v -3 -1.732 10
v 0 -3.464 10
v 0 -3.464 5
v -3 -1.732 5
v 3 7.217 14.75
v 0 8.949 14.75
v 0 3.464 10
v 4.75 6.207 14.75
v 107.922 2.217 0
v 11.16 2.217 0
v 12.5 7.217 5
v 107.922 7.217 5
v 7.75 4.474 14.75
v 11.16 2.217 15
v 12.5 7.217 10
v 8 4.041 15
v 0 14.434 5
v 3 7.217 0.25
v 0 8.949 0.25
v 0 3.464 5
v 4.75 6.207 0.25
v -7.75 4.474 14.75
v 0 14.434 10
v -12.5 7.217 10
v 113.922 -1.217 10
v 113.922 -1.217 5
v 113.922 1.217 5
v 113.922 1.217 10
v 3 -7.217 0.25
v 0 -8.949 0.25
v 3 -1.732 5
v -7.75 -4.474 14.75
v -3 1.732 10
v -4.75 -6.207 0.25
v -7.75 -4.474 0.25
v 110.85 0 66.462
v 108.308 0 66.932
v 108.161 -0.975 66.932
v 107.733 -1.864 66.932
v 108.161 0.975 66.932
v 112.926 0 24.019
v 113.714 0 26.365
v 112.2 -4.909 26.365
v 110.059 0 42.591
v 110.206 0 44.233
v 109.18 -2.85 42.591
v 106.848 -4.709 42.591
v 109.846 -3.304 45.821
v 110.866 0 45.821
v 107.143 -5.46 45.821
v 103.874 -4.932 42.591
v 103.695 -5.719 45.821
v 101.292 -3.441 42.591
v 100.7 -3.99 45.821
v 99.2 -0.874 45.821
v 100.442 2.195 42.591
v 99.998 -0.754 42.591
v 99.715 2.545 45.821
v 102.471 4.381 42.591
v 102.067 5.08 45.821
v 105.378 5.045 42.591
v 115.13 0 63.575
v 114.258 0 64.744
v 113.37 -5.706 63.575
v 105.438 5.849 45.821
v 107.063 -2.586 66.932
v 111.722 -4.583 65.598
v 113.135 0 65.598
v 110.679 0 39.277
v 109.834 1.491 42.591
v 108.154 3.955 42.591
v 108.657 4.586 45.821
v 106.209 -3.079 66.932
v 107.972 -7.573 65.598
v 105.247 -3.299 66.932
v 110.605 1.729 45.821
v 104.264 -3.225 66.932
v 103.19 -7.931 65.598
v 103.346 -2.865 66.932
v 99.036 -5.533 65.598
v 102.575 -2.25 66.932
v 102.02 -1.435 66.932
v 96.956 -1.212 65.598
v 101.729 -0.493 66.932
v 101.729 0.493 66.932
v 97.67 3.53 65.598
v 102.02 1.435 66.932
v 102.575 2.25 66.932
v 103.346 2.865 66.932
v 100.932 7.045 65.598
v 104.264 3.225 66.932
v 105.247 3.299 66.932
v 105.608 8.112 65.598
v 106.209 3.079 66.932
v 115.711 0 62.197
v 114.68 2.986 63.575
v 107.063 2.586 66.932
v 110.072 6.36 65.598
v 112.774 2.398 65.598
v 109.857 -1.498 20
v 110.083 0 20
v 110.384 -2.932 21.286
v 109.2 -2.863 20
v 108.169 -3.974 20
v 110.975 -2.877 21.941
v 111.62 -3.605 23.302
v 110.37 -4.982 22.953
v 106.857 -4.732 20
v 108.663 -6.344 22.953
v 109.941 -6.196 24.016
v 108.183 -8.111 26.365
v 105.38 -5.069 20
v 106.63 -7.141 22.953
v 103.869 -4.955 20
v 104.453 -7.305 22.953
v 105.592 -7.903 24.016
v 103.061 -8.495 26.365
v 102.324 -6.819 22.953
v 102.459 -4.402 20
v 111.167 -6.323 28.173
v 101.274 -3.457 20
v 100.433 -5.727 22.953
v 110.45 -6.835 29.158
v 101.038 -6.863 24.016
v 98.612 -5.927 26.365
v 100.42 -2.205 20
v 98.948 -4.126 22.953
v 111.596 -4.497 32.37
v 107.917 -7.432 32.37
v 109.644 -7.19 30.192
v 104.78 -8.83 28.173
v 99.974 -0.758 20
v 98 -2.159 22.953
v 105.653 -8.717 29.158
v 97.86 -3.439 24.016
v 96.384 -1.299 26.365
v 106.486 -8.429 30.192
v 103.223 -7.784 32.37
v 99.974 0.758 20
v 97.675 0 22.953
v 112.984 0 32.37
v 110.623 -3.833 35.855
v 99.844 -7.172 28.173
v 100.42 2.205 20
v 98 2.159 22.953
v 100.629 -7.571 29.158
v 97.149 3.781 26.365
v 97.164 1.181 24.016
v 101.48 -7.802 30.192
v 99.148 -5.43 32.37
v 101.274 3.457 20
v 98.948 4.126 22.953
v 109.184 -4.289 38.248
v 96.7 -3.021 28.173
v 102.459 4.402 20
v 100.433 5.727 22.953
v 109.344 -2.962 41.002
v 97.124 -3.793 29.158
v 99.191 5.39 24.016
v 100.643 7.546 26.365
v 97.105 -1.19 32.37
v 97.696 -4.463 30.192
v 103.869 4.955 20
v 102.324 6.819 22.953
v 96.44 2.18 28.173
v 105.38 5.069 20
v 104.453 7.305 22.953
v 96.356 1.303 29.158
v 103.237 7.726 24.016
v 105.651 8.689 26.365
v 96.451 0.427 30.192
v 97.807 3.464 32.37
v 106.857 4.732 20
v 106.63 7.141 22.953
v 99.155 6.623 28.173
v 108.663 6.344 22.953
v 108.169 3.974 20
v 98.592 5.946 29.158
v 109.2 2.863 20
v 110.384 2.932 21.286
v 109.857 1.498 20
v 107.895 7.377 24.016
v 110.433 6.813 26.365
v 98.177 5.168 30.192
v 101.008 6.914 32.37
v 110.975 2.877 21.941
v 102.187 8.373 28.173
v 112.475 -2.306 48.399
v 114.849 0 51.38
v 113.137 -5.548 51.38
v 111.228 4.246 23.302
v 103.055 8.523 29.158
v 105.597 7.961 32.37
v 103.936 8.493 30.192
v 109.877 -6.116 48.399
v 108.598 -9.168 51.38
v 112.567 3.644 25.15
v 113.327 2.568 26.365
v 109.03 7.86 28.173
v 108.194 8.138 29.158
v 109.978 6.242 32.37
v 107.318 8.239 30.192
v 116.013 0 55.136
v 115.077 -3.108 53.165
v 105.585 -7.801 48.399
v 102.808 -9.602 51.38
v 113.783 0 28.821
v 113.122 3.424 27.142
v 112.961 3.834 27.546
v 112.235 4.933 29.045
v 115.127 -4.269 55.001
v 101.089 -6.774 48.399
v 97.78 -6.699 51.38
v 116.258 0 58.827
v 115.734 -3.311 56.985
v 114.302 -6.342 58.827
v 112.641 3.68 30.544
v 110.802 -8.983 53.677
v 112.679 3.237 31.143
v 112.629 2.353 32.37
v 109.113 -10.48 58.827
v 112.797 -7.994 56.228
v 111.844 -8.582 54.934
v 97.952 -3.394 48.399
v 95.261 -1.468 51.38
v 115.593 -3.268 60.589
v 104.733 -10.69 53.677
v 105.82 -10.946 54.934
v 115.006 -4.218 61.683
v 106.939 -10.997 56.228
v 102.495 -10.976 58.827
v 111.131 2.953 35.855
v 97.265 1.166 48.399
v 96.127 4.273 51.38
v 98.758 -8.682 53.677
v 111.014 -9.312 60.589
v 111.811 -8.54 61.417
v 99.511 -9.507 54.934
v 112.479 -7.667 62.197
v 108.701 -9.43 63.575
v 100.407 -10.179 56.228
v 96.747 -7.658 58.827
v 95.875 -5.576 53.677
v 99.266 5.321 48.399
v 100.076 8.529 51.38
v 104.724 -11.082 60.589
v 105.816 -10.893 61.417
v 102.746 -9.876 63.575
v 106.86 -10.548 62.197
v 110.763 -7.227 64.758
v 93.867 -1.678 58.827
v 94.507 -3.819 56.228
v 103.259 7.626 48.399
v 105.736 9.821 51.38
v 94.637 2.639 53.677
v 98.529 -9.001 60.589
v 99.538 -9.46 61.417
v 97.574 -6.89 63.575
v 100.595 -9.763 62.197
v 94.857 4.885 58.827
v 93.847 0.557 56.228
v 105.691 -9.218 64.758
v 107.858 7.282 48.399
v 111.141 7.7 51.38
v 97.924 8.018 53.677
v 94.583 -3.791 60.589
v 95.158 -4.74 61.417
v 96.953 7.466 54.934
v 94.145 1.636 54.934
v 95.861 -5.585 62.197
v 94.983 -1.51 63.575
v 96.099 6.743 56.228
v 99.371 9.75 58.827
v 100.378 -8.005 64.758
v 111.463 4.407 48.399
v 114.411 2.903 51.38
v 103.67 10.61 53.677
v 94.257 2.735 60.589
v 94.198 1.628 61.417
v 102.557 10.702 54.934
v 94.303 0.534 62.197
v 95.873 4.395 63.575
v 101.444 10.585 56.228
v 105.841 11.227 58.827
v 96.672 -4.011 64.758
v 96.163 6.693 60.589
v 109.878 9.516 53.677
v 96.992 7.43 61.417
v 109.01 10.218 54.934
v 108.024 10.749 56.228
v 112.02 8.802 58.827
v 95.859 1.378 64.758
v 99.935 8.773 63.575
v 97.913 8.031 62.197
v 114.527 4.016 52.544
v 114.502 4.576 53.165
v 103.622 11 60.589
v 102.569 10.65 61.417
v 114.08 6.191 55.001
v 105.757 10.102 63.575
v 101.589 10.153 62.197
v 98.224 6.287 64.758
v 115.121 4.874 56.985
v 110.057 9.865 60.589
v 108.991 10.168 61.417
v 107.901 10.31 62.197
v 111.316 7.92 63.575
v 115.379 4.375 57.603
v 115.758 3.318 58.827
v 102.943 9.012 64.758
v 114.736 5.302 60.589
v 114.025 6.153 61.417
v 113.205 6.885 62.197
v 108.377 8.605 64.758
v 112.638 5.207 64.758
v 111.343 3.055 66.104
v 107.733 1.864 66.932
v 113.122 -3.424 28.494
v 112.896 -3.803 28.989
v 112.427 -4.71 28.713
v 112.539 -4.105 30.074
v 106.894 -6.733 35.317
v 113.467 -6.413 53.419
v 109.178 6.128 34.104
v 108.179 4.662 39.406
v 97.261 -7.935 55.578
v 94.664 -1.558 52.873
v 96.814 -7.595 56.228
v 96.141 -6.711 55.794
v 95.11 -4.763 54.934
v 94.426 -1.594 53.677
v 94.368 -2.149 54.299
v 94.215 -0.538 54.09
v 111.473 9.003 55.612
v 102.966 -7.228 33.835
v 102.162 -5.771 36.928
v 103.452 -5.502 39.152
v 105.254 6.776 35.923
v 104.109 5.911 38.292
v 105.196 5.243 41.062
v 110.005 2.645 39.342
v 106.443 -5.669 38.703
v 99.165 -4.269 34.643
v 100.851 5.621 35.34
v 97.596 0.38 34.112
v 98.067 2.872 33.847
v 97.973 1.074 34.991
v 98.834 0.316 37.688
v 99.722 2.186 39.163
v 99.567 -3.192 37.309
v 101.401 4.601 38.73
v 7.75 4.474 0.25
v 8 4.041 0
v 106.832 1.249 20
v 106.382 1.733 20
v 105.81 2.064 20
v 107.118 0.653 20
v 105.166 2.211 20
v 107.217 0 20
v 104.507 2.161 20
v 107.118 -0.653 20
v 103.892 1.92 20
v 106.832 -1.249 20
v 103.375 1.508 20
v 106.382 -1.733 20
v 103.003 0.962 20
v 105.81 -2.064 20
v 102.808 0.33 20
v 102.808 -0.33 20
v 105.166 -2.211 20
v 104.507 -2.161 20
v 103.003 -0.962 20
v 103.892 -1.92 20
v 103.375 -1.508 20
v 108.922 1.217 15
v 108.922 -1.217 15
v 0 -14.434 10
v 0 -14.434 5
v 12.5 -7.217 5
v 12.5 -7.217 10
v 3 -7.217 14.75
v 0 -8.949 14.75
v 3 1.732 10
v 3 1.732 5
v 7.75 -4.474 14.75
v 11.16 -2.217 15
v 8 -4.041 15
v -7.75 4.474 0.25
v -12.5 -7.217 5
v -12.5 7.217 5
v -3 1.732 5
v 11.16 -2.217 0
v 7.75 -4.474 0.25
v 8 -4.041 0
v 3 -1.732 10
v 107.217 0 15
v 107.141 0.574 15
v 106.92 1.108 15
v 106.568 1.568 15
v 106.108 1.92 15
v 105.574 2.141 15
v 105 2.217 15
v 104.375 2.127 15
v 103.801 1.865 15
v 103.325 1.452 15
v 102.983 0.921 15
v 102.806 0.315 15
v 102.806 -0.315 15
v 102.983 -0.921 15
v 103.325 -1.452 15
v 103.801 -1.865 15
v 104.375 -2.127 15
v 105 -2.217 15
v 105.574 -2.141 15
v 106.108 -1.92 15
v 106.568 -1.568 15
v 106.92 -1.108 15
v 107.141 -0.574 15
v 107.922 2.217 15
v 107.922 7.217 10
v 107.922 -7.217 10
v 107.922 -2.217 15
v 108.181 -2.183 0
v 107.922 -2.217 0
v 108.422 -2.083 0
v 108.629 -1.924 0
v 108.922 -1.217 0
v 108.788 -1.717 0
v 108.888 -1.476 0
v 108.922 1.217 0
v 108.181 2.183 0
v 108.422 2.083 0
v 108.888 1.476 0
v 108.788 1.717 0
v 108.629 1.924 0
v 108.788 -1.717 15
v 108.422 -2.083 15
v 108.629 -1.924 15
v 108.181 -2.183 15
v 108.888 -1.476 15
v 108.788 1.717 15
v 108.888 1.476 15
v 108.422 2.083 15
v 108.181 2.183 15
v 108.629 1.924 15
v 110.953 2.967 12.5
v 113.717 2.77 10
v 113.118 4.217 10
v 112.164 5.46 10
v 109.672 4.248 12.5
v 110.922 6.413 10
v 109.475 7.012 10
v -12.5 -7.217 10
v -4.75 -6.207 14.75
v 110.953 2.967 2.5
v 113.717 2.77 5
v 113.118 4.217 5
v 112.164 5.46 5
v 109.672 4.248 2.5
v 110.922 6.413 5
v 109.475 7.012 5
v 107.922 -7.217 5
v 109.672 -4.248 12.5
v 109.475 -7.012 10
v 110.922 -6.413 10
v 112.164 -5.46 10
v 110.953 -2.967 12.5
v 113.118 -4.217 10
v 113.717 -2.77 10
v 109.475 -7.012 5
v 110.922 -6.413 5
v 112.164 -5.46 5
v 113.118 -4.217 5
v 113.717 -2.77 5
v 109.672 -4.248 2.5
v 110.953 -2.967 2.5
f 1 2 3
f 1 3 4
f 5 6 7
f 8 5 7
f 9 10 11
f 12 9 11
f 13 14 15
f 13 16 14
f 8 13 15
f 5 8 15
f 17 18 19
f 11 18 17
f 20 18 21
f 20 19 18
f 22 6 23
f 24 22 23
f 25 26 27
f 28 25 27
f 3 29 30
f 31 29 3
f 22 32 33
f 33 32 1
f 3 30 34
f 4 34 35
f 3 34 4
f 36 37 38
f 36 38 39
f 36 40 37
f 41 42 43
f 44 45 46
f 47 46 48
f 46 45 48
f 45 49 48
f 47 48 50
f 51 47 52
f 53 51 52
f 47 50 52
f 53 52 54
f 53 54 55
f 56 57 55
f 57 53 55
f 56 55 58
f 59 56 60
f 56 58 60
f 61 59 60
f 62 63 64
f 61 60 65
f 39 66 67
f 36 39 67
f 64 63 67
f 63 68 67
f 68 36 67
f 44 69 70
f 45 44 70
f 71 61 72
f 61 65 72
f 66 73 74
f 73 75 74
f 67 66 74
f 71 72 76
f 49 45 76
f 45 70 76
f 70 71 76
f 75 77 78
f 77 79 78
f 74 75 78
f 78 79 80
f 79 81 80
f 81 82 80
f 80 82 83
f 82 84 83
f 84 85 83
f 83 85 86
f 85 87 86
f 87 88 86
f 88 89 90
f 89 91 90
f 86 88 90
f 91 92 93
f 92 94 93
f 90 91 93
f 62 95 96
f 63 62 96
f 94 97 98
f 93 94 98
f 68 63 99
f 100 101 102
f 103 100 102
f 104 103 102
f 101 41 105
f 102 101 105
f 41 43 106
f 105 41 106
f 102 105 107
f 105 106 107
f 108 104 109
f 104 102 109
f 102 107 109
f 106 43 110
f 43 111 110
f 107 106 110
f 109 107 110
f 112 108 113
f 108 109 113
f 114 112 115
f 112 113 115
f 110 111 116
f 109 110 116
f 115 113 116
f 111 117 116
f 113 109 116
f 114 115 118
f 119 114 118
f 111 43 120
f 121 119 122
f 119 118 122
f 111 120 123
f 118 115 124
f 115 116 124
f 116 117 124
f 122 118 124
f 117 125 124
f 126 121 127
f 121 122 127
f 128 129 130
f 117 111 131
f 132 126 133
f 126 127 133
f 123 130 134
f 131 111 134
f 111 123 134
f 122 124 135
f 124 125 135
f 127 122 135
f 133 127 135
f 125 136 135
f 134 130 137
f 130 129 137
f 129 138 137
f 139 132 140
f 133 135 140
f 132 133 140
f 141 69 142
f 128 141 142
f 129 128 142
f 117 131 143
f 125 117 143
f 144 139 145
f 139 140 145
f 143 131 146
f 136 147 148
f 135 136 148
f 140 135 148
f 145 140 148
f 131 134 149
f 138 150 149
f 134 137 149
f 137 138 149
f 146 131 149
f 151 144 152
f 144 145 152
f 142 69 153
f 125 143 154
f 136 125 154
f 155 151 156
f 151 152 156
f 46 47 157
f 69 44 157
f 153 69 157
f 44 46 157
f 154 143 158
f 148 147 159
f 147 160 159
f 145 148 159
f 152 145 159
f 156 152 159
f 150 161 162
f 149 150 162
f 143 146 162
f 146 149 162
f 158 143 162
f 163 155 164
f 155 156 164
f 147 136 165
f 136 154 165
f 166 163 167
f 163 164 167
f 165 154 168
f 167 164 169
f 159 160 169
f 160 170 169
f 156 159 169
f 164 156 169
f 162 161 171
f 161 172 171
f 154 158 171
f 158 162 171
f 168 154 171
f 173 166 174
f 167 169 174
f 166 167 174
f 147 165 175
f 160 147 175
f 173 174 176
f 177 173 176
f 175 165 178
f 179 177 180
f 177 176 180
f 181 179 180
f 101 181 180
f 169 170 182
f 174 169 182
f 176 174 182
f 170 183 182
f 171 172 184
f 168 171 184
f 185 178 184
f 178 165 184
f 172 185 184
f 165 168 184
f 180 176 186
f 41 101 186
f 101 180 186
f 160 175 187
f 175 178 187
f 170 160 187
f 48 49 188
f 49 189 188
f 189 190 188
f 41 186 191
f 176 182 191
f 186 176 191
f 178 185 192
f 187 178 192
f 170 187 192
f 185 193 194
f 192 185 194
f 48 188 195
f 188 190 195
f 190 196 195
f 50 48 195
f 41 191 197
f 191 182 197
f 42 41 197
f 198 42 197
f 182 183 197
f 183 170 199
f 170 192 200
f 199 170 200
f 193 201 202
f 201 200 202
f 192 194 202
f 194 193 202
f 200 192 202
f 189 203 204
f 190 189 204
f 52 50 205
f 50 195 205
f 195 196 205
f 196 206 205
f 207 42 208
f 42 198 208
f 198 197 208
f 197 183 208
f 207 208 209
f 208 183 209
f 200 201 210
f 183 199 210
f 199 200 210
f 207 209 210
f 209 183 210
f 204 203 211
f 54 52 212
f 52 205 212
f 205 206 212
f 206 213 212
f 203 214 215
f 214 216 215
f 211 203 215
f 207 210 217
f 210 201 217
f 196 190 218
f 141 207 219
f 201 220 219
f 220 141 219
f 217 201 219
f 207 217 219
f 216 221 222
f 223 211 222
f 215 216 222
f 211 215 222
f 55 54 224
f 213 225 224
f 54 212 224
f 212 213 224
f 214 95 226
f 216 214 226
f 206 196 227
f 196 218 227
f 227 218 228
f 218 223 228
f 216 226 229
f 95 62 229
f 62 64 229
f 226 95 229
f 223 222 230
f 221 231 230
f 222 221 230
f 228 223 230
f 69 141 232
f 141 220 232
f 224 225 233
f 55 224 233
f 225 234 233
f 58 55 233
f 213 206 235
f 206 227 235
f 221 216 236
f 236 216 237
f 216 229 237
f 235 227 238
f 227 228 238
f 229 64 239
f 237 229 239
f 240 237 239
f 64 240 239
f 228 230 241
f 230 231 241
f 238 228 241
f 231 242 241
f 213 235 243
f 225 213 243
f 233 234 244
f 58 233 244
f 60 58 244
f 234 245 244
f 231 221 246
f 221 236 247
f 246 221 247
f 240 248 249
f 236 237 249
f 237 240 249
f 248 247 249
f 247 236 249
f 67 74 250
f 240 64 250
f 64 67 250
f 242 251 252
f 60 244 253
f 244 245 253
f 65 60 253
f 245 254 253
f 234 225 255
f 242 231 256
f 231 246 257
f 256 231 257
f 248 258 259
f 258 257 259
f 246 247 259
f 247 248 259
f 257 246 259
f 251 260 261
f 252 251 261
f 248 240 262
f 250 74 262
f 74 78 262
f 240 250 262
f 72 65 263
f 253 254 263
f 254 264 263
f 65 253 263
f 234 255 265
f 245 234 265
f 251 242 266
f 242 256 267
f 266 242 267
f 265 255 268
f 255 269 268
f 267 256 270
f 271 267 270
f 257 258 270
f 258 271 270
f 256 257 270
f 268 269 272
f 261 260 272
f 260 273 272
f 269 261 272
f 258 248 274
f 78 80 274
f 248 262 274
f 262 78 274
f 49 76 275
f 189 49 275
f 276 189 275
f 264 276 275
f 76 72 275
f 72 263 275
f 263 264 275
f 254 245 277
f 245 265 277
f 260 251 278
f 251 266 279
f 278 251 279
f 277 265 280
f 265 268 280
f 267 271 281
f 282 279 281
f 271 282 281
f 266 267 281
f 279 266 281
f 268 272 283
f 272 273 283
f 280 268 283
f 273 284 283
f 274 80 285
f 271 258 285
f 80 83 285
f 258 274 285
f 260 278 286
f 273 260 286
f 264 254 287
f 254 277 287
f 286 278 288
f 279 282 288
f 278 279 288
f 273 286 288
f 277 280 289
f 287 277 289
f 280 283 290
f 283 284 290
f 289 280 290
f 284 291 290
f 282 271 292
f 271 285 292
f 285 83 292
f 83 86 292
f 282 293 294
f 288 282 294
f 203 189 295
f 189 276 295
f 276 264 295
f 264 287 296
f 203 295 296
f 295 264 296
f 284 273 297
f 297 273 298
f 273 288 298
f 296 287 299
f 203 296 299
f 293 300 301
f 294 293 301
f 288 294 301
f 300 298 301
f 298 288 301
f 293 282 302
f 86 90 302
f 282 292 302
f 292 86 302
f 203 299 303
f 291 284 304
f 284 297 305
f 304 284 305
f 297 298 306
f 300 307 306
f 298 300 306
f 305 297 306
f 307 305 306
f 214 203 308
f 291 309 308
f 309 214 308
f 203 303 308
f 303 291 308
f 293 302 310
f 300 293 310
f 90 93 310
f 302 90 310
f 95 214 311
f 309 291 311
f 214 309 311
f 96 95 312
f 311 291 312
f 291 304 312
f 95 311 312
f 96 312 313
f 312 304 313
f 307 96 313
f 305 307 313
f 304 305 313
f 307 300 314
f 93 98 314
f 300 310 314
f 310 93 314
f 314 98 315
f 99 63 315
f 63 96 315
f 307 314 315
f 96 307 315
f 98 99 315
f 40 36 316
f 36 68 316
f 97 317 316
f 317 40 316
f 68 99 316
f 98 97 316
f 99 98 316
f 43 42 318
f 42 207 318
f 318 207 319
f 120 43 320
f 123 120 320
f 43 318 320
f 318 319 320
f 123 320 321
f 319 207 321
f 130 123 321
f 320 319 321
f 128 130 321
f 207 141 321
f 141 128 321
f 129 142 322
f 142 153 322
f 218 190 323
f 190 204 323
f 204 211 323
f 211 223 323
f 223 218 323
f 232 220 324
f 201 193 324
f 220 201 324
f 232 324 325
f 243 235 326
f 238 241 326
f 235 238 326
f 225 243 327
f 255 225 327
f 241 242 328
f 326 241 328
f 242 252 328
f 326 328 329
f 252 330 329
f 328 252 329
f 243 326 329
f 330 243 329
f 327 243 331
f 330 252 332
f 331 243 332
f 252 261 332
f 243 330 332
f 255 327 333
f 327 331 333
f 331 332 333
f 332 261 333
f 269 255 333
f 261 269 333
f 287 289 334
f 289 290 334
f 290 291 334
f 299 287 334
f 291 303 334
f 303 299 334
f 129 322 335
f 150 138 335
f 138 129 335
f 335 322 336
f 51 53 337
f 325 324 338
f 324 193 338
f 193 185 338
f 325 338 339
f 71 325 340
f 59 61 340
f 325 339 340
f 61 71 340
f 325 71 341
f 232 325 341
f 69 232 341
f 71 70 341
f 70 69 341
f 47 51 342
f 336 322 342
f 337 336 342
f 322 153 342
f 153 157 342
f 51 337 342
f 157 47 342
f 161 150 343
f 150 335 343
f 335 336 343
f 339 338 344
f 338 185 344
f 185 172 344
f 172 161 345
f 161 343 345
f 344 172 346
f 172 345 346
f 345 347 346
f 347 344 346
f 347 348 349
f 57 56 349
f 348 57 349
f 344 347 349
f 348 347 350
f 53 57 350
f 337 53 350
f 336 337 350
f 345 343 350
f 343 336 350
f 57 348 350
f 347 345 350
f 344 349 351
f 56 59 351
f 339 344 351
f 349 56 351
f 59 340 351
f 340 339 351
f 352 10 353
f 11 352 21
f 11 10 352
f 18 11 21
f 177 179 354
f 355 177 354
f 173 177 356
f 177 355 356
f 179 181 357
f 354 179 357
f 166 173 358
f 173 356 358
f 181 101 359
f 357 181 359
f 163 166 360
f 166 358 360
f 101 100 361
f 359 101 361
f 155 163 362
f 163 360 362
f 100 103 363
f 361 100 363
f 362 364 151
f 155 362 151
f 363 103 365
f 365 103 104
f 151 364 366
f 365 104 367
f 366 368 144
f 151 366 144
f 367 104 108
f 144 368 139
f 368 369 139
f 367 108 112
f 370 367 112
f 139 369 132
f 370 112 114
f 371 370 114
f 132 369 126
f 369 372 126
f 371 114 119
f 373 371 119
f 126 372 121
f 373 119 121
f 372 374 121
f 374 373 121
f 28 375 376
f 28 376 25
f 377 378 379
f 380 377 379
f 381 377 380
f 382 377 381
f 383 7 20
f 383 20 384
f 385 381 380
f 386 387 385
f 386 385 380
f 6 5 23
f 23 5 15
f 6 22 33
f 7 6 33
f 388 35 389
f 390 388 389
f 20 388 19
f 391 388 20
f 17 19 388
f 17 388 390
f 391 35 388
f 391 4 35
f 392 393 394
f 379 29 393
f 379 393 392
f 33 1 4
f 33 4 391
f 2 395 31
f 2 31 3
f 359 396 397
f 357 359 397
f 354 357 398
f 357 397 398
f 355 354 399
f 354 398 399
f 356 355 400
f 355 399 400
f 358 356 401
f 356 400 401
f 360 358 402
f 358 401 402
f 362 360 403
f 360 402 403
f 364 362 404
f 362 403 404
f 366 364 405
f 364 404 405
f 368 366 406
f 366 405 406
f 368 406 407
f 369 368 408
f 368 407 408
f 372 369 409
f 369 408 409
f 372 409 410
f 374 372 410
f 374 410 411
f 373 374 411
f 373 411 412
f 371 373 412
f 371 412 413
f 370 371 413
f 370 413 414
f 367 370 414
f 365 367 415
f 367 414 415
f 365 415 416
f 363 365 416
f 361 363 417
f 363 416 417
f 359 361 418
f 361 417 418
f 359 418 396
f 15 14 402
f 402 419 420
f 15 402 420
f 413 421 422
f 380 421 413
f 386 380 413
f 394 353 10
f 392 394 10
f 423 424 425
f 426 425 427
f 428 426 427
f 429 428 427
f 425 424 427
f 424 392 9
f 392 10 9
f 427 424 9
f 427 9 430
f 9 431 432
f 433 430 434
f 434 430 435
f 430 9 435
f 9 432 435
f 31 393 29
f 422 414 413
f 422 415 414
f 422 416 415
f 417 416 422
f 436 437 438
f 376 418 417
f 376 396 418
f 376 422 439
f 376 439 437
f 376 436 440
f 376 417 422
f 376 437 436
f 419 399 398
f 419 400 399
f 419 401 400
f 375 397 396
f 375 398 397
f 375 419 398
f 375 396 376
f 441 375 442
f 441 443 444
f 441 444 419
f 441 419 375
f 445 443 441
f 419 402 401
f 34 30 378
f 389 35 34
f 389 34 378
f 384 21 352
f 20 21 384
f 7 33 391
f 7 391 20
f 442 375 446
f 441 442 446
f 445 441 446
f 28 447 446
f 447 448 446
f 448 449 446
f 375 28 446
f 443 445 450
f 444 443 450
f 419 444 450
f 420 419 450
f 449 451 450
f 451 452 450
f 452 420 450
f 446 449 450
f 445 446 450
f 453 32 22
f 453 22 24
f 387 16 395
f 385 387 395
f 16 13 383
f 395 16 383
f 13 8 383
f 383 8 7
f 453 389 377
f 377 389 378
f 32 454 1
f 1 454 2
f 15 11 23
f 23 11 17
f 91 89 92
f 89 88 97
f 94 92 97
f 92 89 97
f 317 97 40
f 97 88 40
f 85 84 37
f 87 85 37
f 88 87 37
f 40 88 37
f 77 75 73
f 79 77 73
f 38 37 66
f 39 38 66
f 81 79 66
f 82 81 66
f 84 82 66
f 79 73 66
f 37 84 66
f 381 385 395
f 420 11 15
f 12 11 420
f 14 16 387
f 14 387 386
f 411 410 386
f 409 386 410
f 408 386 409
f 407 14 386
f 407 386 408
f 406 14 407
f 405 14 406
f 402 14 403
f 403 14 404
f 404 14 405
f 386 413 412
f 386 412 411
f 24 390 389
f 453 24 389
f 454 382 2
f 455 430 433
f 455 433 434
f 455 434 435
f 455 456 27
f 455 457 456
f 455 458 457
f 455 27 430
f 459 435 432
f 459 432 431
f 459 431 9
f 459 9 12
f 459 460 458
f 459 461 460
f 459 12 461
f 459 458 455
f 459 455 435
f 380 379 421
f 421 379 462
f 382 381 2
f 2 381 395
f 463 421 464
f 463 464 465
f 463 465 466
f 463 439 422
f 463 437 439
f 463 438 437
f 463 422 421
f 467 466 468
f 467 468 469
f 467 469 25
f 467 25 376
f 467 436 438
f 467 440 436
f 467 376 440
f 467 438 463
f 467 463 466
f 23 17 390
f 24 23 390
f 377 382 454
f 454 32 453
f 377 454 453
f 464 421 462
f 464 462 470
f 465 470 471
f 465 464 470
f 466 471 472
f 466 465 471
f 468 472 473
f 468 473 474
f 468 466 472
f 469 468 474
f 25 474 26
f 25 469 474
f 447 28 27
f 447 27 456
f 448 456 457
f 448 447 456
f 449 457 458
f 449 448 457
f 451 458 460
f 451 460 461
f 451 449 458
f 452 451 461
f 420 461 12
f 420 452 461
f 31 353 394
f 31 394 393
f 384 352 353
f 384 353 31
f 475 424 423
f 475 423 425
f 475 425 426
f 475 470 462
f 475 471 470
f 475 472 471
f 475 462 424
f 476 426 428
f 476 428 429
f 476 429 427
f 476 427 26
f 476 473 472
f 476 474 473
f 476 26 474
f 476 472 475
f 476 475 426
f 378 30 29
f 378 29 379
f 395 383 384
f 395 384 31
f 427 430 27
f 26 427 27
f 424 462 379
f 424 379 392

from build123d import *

# Parameters (mm, degrees)
F0_W          = 101.4218062162
F0_H          = 14.4337567297
F1_DEPTH      = 15
F2_R          = 6
F3_T1_DEPTH   = 2.4337567297
F3_T3_DEPTH   = 40.1505866094
F3_T5_DEPTH   = 40.1505866094
F3_T7_DEPTH   = 40.1505866094
F3_T12_DEPTH  = 108.2802211561
F3_T17_DEPTH  = 108.2802211561
F3_T20_ANGLE  = 90
F3_T24_DEPTH  = 40.1505866094
F3_T27_ANGLE  = 90
F3_T31_DEPTH  = 108.2802211561
F3_T36_DEPTH  = 108.2802211561
F3_T41_DEPTH  = 40.1505866094
F3_T46_DEPTH  = 29.1809314948
F3_T52_DEPTH  = 29.1809314948
F3_T58_DEPTH  = 29.1809314948
F3_T64_DEPTH  = 29.1809314948
F3_T70_DEPTH  = 29.1809314948
F3_T76_DEPTH  = 29.1809314948
F3_T82_DEPTH  = 108.2802211561
F3_T87_DEPTH  = 108.2802211561
F3_T90_ANGLE  = 90
F3_T94_DEPTH  = 40.1505866094
F3_T97_ANGLE  = 90
F3_T101_DEPTH = 108.2802211561
F3_T106_DEPTH = 108.2802211561
F3_T111_DEPTH = 40.1505866094
F3_T116_DEPTH = 29.1809314948
F3_T122_DEPTH = 29.1809314948
F3_T128_DEPTH = 29.1809314948
F3_T134_DEPTH = 29.1809314948
F3_T140_DEPTH = 29.1809314948
F3_T146_DEPTH = 29.1809314948
F4_R          = 2.2168783649
F5_DEPTH      = 5


# Not quite as in the source:
# - a fillet or chamfer that OpenCascade refuses, or shapes differently, is made with other operations: its cross-section is extruded or revolved along the edge and cut away or added


with BuildPart() as f1:
    # F0 (on Top) → F1 (new body)
    with BuildSketch(Plane.XY):
        Polygon((12.5, -7.2168783649), (12.5, 7.2168783649), (0, 14.4337567297), (-12.5, 7.2168783649), (-12.5, -7.2168783649), (0, -14.4337567297), align=None)
        Polygon((0, 3.4641016151), (3, 1.7320508076), (3, -1.7320508076), (0, -3.4641016151), (-3, -1.7320508076), (-3, 1.7320508076), align=None, mode=Mode.SUBTRACT)
        with Locations((63.2109031081, 0)):
            Rectangle(F0_W, F0_H)
    extrude(amount=F1_DEPTH)

    # F2
    f2_edges = [f1.edges().sort_by_distance(p)[0] for p in [
        (113.921806, -7.216878, 7.5),
        (113.921806, 7.216878, 7.5),
    ]]
    fillet(f2_edges, radius=F2_R)

    # F3: chamfer of 5 on 32 edges, made by hand

    # F3_s2 → F3_t1 (cut)
    with BuildSketch(Plane.XZ.offset(-1.2168783649)):
        Polygon((108.9218062162, 15), (113.9218062162, 10), (113.9218062162, 15), align=None)
        Polygon((108.9218062162, 0), (113.9218062162, 5), (113.9218062162, 0), align=None)
    extrude(amount=F3_T1_DEPTH, mode=Mode.SUBTRACT)

    # F3_s4 → F3_t3 (cut)
    with BuildSketch(Plane(origin=(-17.3857139903, 10.0376466523, 0), x_dir=(0, 0, 1), z_dir=(0.8660254038, -0.5, 0))):
        Polygon((15, 7.5), (10, 12.5), (15, 12.5), align=None)
        Polygon((0, 7.5), (5, 12.5), (0, 12.5), align=None)
    extrude(amount=F3_T3_DEPTH, mode=Mode.SUBTRACT)

    # F3_s6 → F3_t5 (cut)
    with BuildSketch(Plane.XZ.offset(-20.0752933047)):
        Polygon((-7.5, 15), (-12.5, 10), (-12.5, 15), align=None)
        Polygon((-7.5, 0), (-12.5, 5), (-12.5, 0), align=None)
    extrude(amount=F3_T5_DEPTH, mode=Mode.SUBTRACT)

    # F3_s8 → F3_t7 (cut)
    with BuildSketch(Plane(origin=(17.3857139903, 10.0376466523, 0), x_dir=(0, 0, 1), z_dir=(-0.8660254038, -0.5, 0))):
        Polygon((15, 7.5), (10, 12.5), (15, 12.5), align=None)
        Polygon((0, 7.5), (5, 12.5), (0, 12.5), align=None)
    extrude(amount=F3_T7_DEPTH, mode=Mode.SUBTRACT)


with BuildPart() as f3_tool10:
    # F3_s11 → F3_t12 (new body)
    with BuildSketch(Plane.YZ.offset(-0.3584149398)):
        Polygon((-7.2168783649, 10), (-2.2168783649, 15), (-7.2168783649, 15), align=None)
    extrude(amount=F3_T12_DEPTH)

    split(bisect_by=Plane(origin=(1.5, -2.5980762114, 0), x_dir=(0, 0, 1), z_dir=(-0.5, 0.8660254038, 0)), keep=Keep.TOP)


with BuildPart() as f1_1:
    add(f1.part)

    # F3_t9: cut F3_tool10
    add(f3_tool10.part, mode=Mode.SUBTRACT)


with BuildPart() as f3_tool15:
    # F3_s16 → F3_t17 (new body)
    with BuildSketch(Plane.YZ.offset(-0.3584149398)):
        Polygon((-7.2168783649, 10), (-2.2168783649, 15), (-7.2168783649, 15), align=None)
    extrude(amount=F3_T17_DEPTH)

    split(bisect_by=Plane(origin=(5.625, -9.7427857926, 11.25), x_dir=(0.8660254038, 0.5, 0), z_dir=(0.3535533906, -0.6123724357, 0.7071067812)), keep=Keep.TOP)


with BuildPart() as f1_2:
    add(f1_1.part)

    # F3_t14: cut F3_tool15
    add(f3_tool15.part, mode=Mode.SUBTRACT)

    # F3_s19 → F3_t20 (revolve, cut)
    with BuildSketch(Plane.YZ.offset(107.9218062162)):
        Polygon((-7.2168783649, 10), (-2.2168783649, 15), (-7.2168783649, 15), align=None)
    revolve(axis=Axis((107.9218062162, -1.2168783649, 15), (0, 0, 1)), revolution_arc=F3_T20_ANGLE, mode=Mode.SUBTRACT)


with BuildPart() as f3_tool22:
    # F3_s23 → F3_t24 (new body)
    with BuildSketch(Plane(origin=(-17.3857139903, -10.0376466523, 0), x_dir=(0, 0, 1), z_dir=(0.8660254038, 0.5, 0))):
        Polygon((10, 12.5), (15, 7.5), (15, 12.5), align=None)
    extrude(amount=F3_T24_DEPTH)

    split(bisect_by=Plane(origin=(0, -8.6084391824, 8.6084391824), x_dir=(1, 0, 0), z_dir=(0, -0.7071067812, 0.7071067812)), keep=Keep.TOP)


with BuildPart() as f1_3:
    add(f1_2.part)

    # F3_t21: cut F3_tool22
    add(f3_tool22.part, mode=Mode.SUBTRACT)

    # F3_s26 → F3_t27 (revolve, cut)
    with BuildSketch(Plane.XZ.offset(-1.2168783649)):
        Polygon((108.9218062162, 15), (113.9218062162, 10), (113.9218062162, 15), align=None)
    revolve(axis=Axis((107.9218062162, 1.2168783649, 15), (0, 0, 1)), revolution_arc=F3_T27_ANGLE, mode=Mode.SUBTRACT)


with BuildPart() as f3_tool29:
    # F3_s30 → F3_t31 (new body)
    with BuildSketch(Plane.YZ.offset(107.9218062162)):
        Polygon((2.2168783649, 15), (7.2168783649, 10), (7.2168783649, 15), align=None)
    extrude(amount=-F3_T31_DEPTH)

    split(bisect_by=Plane(origin=(5.625, 9.7427857926, 11.25), x_dir=(-0.8660254038, 0.5, 0), z_dir=(0.3535533906, 0.6123724357, 0.7071067812)), keep=Keep.TOP)


with BuildPart() as f1_4:
    add(f1_3.part)

    # F3_t28: cut F3_tool29
    add(f3_tool29.part, mode=Mode.SUBTRACT)


with BuildPart() as f3_tool34:
    # F3_s35 → F3_t36 (new body)
    with BuildSketch(Plane.YZ.offset(107.9218062162)):
        Polygon((2.2168783649, 15), (7.2168783649, 10), (7.2168783649, 15), align=None)
    extrude(amount=-F3_T36_DEPTH)

    split(bisect_by=Plane(origin=(1.5, 2.5980762114, 0), x_dir=(0, 0, 1), z_dir=(-0.5, -0.8660254038, 0)), keep=Keep.TOP)


with BuildPart() as f1_5:
    add(f1_4.part)

    # F3_t33: cut F3_tool34
    add(f3_tool34.part, mode=Mode.SUBTRACT)


with BuildPart() as f3_tool39:
    # F3_s40 → F3_t41 (new body)
    with BuildSketch(Plane(origin=(17.3857139903, -10.0376466523, 0), x_dir=(0, 0, 1), z_dir=(-0.8660254038, 0.5, 0))):
        Polygon((15, 7.5), (10, 12.5), (15, 12.5), align=None)
    extrude(amount=F3_T41_DEPTH)

    split(bisect_by=Plane(origin=(0, 8.6084391824, 8.6084391824), x_dir=(1, 0, 0), z_dir=(0, 0.7071067812, 0.7071067812)), keep=Keep.TOP)


with BuildPart() as f1_6:
    add(f1_5.part)

    # F3_t38: cut F3_tool39
    add(f3_tool39.part, mode=Mode.SUBTRACT)


with BuildPart() as f3_tool44:
    # F3_s45 → F3_t46 (new body)
    with BuildSketch(Plane(origin=(-12.6357139903, -7.2952328737, 0), x_dir=(0, 0, 1), z_dir=(0.8660254038, 0.5, 0))):
        Polygon((15, -8), (10, -3), (15, -3), align=None)
    extrude(amount=F3_T46_DEPTH)

    split(bisect_by=Plane(origin=(3.5, 0, 3.5), x_dir=(0, 1, 0), z_dir=(0.7071067812, 0, 0.7071067812)), keep=Keep.TOP)

    split(bisect_by=Plane(origin=(-1.75, -3.0310889132, 3.5), x_dir=(0.8660254038, -0.5, 0), z_dir=(-0.3535533906, -0.6123724357, 0.7071067812)), keep=Keep.TOP)


with BuildPart() as f1_7:
    add(f1_6.part)

    # F3_t43: cut F3_tool44
    add(f3_tool44.part, mode=Mode.SUBTRACT)


with BuildPart() as f3_tool50:
    # F3_s51 → F3_t52 (new body)
    with BuildSketch(Plane(origin=(-12.6357139903, 7.2952328737, 0), x_dir=(0, 0, 1), z_dir=(0.8660254038, -0.5, 0))):
        Polygon((15, -8), (10, -3), (15, -3), align=None)
    extrude(amount=F3_T52_DEPTH)

    split(bisect_by=Plane(origin=(-3.5, 0, 3.5), x_dir=(0, 1, 0), z_dir=(-0.7071067812, 0, 0.7071067812)), keep=Keep.TOP)

    split(bisect_by=Plane(origin=(1.75, -3.0310889132, 3.5), x_dir=(0.8660254038, 0.5, 0), z_dir=(0.3535533906, -0.6123724357, 0.7071067812)), keep=Keep.TOP)


with BuildPart() as f1_8:
    add(f1_7.part)

    # F3_t49: cut F3_tool50
    add(f3_tool50.part, mode=Mode.SUBTRACT)


with BuildPart() as f3_tool56:
    # F3_s57 → F3_t58 (new body)
    with BuildSketch(Plane.XZ.offset(-14.5904657474)):
        Polygon((8, 15), (3, 10), (3, 15), align=None)
    extrude(amount=F3_T58_DEPTH)

    split(bisect_by=Plane(origin=(-1.75, 3.0310889132, 3.5), x_dir=(-0.8660254038, -0.5, 0), z_dir=(-0.3535533906, 0.6123724357, 0.7071067812)), keep=Keep.TOP)

    split(bisect_by=Plane(origin=(-1.75, -3.0310889132, 3.5), x_dir=(0.8660254038, -0.5, 0), z_dir=(-0.3535533906, -0.6123724357, 0.7071067812)), keep=Keep.TOP)


with BuildPart() as f1_9:
    add(f1_8.part)

    # F3_t55: cut F3_tool56
    add(f3_tool56.part, mode=Mode.SUBTRACT)


with BuildPart() as f3_tool62:
    # F3_s63 → F3_t64 (new body)
    with BuildSketch(Plane(origin=(12.6357139903, 7.2952328737, 0), x_dir=(0, 0, 1), z_dir=(-0.8660254038, -0.5, 0))):
        Polygon((15, -8), (10, -3), (15, -3), align=None)
    extrude(amount=F3_T64_DEPTH)

    split(bisect_by=Plane(origin=(-3.5, 0, 3.5), x_dir=(0, 1, 0), z_dir=(-0.7071067812, 0, 0.7071067812)), keep=Keep.TOP)

    split(bisect_by=Plane(origin=(1.75, 3.0310889132, 3.5), x_dir=(-0.8660254038, 0.5, 0), z_dir=(0.3535533906, 0.6123724357, 0.7071067812)), keep=Keep.TOP)


with BuildPart() as f1_10:
    add(f1_9.part)

    # F3_t61: cut F3_tool62
    add(f3_tool62.part, mode=Mode.SUBTRACT)


with BuildPart() as f3_tool68:
    # F3_s69 → F3_t70 (new body)
    with BuildSketch(Plane(origin=(12.6357139903, -7.2952328737, 0), x_dir=(0, 0, 1), z_dir=(-0.8660254038, 0.5, 0))):
        Polygon((15, -8), (10, -3), (15, -3), align=None)
    extrude(amount=F3_T70_DEPTH)

    split(bisect_by=Plane(origin=(-1.75, 3.0310889132, 3.5), x_dir=(-0.8660254038, -0.5, 0), z_dir=(-0.3535533906, 0.6123724357, 0.7071067812)), keep=Keep.TOP)

    split(bisect_by=Plane(origin=(3.5, 0, 3.5), x_dir=(0, 1, 0), z_dir=(0.7071067812, 0, 0.7071067812)), keep=Keep.TOP)


with BuildPart() as f1_11:
    add(f1_10.part)

    # F3_t67: cut F3_tool68
    add(f3_tool68.part, mode=Mode.SUBTRACT)


with BuildPart() as f3_tool74:
    # F3_s75 → F3_t76 (new body)
    with BuildSketch(Plane.XZ.offset(14.5904657474)):
        Polygon((-8, 15), (-3, 10), (-3, 15), align=None)
    extrude(amount=-F3_T76_DEPTH)

    split(bisect_by=Plane(origin=(1.75, 3.0310889132, 3.5), x_dir=(-0.8660254038, 0.5, 0), z_dir=(0.3535533906, 0.6123724357, 0.7071067812)), keep=Keep.TOP)

    split(bisect_by=Plane(origin=(1.75, -3.0310889132, 3.5), x_dir=(0.8660254038, 0.5, 0), z_dir=(0.3535533906, -0.6123724357, 0.7071067812)), keep=Keep.TOP)


with BuildPart() as f1_12:
    add(f1_11.part)

    # F3_t73: cut F3_tool74
    add(f3_tool74.part, mode=Mode.SUBTRACT)


with BuildPart() as f3_tool80:
    # F3_s81 → F3_t82 (new body)
    with BuildSketch(Plane.YZ.offset(-0.3584149398)):
        Polygon((-7.2168783649, 5), (-2.2168783649, 0), (-7.2168783649, 0), align=None)
    extrude(amount=F3_T82_DEPTH)

    split(bisect_by=Plane(origin=(1.5, -2.5980762114, 0), x_dir=(0, 0, 1), z_dir=(-0.5, 0.8660254038, 0)), keep=Keep.TOP)


with BuildPart() as f1_13:
    add(f1_12.part)

    # F3_t79: cut F3_tool80
    add(f3_tool80.part, mode=Mode.SUBTRACT)


with BuildPart() as f3_tool85:
    # F3_s86 → F3_t87 (new body)
    with BuildSketch(Plane.YZ.offset(-0.3584149398)):
        Polygon((-7.2168783649, 5), (-2.2168783649, 0), (-7.2168783649, 0), align=None)
    extrude(amount=F3_T87_DEPTH)

    split(bisect_by=Plane(origin=(1.875, -3.2475952642, -3.75), x_dir=(0.8660254038, 0.5, 0), z_dir=(0.3535533906, -0.6123724357, -0.7071067812)), keep=Keep.TOP)


with BuildPart() as f1_14:
    add(f1_13.part)

    # F3_t84: cut F3_tool85
    add(f3_tool85.part, mode=Mode.SUBTRACT)

    # F3_s89 → F3_t90 (revolve, cut)
    with BuildSketch(Plane.YZ.offset(107.9218062162)):
        Polygon((-2.2168783649, 0), (-7.2168783649, 5), (-7.2168783649, 0), align=None)
    revolve(axis=Axis((107.9218062162, -1.2168783649, 0), (0, 0, 1)), revolution_arc=F3_T90_ANGLE, mode=Mode.SUBTRACT)


with BuildPart() as f3_tool92:
    # F3_s93 → F3_t94 (new body)
    with BuildSketch(Plane(origin=(-17.3857139903, -10.0376466523, 0), x_dir=(0, 0, 1), z_dir=(0.8660254038, 0.5, 0))):
        Polygon((0, 7.5), (5, 12.5), (0, 12.5), align=None)
    extrude(amount=F3_T94_DEPTH)

    split(bisect_by=Plane(origin=(0, -1.1084391824, -1.1084391824), x_dir=(1, 0, 0), z_dir=(0, -0.7071067812, -0.7071067812)), keep=Keep.TOP)


with BuildPart() as f1_15:
    add(f1_14.part)

    # F3_t91: cut F3_tool92
    add(f3_tool92.part, mode=Mode.SUBTRACT)

    # F3_s96 → F3_t97 (revolve, cut)
    with BuildSketch(Plane.XZ.offset(-1.2168783649)):
        Polygon((108.9218062162, 0), (113.9218062162, 5), (113.9218062162, 0), align=None)
    revolve(axis=Axis((107.9218062162, 1.2168783649, 0), (0, 0, 1)), revolution_arc=F3_T97_ANGLE, mode=Mode.SUBTRACT)


with BuildPart() as f3_tool99:
    # F3_s100 → F3_t101 (new body)
    with BuildSketch(Plane.YZ.offset(107.9218062162)):
        Polygon((2.2168783649, 0), (7.2168783649, 5), (7.2168783649, 0), align=None)
    extrude(amount=-F3_T101_DEPTH)

    split(bisect_by=Plane(origin=(1.875, 3.2475952642, -3.75), x_dir=(-0.8660254038, 0.5, 0), z_dir=(0.3535533906, 0.6123724357, -0.7071067812)), keep=Keep.TOP)


with BuildPart() as f1_16:
    add(f1_15.part)

    # F3_t98: cut F3_tool99
    add(f3_tool99.part, mode=Mode.SUBTRACT)


with BuildPart() as f3_tool104:
    # F3_s105 → F3_t106 (new body)
    with BuildSketch(Plane.YZ.offset(107.9218062162)):
        Polygon((2.2168783649, 0), (7.2168783649, 5), (7.2168783649, 0), align=None)
    extrude(amount=-F3_T106_DEPTH)

    split(bisect_by=Plane(origin=(1.5, 2.5980762114, 0), x_dir=(0, 0, 1), z_dir=(-0.5, -0.8660254038, 0)), keep=Keep.TOP)


with BuildPart() as f1_17:
    add(f1_16.part)

    # F3_t103: cut F3_tool104
    add(f3_tool104.part, mode=Mode.SUBTRACT)


with BuildPart() as f3_tool109:
    # F3_s110 → F3_t111 (new body)
    with BuildSketch(Plane(origin=(17.3857139903, -10.0376466523, 0), x_dir=(0, 0, 1), z_dir=(-0.8660254038, 0.5, 0))):
        Polygon((0, 7.5), (5, 12.5), (0, 12.5), align=None)
    extrude(amount=F3_T111_DEPTH)

    split(bisect_by=Plane(origin=(0, 1.1084391824, -1.1084391824), x_dir=(1, 0, 0), z_dir=(0, 0.7071067812, -0.7071067812)), keep=Keep.TOP)


with BuildPart() as f1_18:
    add(f1_17.part)

    # F3_t108: cut F3_tool109
    add(f3_tool109.part, mode=Mode.SUBTRACT)


with BuildPart() as f3_tool114:
    # F3_s115 → F3_t116 (new body)
    with BuildSketch(Plane(origin=(-12.6357139903, -7.2952328737, 0), x_dir=(0, 0, 1), z_dir=(0.8660254038, 0.5, 0))):
        Polygon((0, -8), (5, -3), (0, -3), align=None)
    extrude(amount=F3_T116_DEPTH)

    split(bisect_by=Plane(origin=(-4, 0, 4), x_dir=(0, 1, 0), z_dir=(0.7071067812, 0, -0.7071067812)), keep=Keep.TOP)

    split(bisect_by=Plane(origin=(2, 3.4641016151, 4), x_dir=(0.8660254038, -0.5, 0), z_dir=(-0.3535533906, -0.6123724357, -0.7071067812)), keep=Keep.TOP)


with BuildPart() as f1_19:
    add(f1_18.part)

    # F3_t113: cut F3_tool114
    add(f3_tool114.part, mode=Mode.SUBTRACT)


with BuildPart() as f3_tool120:
    # F3_s121 → F3_t122 (new body)
    with BuildSketch(Plane(origin=(-12.6357139903, 7.2952328737, 0), x_dir=(0, 0, 1), z_dir=(0.8660254038, -0.5, 0))):
        Polygon((0, -8), (5, -3), (0, -3), align=None)
    extrude(amount=F3_T122_DEPTH)

    split(bisect_by=Plane(origin=(-2, 3.4641016151, 4), x_dir=(0.8660254038, 0.5, 0), z_dir=(0.3535533906, -0.6123724357, -0.7071067812)), keep=Keep.TOP)

    split(bisect_by=Plane(origin=(4, 0, 4), x_dir=(0, 1, 0), z_dir=(-0.7071067812, 0, -0.7071067812)), keep=Keep.TOP)


with BuildPart() as f1_20:
    add(f1_19.part)

    # F3_t119: cut F3_tool120
    add(f3_tool120.part, mode=Mode.SUBTRACT)


with BuildPart() as f3_tool126:
    # F3_s127 → F3_t128 (new body)
    with BuildSketch(Plane.XZ.offset(-14.5904657474)):
        Polygon((8, 0), (3, 5), (3, 0), align=None)
    extrude(amount=F3_T128_DEPTH)

    split(bisect_by=Plane(origin=(2, -3.4641016151, 4), x_dir=(-0.8660254038, -0.5, 0), z_dir=(-0.3535533906, 0.6123724357, -0.7071067812)), keep=Keep.TOP)

    split(bisect_by=Plane(origin=(2, 3.4641016151, 4), x_dir=(0.8660254038, -0.5, 0), z_dir=(-0.3535533906, -0.6123724357, -0.7071067812)), keep=Keep.TOP)


with BuildPart() as f1_21:
    add(f1_20.part)

    # F3_t125: cut F3_tool126
    add(f3_tool126.part, mode=Mode.SUBTRACT)


with BuildPart() as f3_tool132:
    # F3_s133 → F3_t134 (new body)
    with BuildSketch(Plane(origin=(12.6357139903, 7.2952328737, 0), x_dir=(0, 0, 1), z_dir=(-0.8660254038, -0.5, 0))):
        Polygon((0, -8), (5, -3), (0, -3), align=None)
    extrude(amount=F3_T134_DEPTH)

    split(bisect_by=Plane(origin=(-2, -3.4641016151, 4), x_dir=(-0.8660254038, 0.5, 0), z_dir=(0.3535533906, 0.6123724357, -0.7071067812)), keep=Keep.TOP)

    split(bisect_by=Plane(origin=(4, 0, 4), x_dir=(0, 1, 0), z_dir=(-0.7071067812, 0, -0.7071067812)), keep=Keep.TOP)


with BuildPart() as f1_22:
    add(f1_21.part)

    # F3_t131: cut F3_tool132
    add(f3_tool132.part, mode=Mode.SUBTRACT)


with BuildPart() as f3_tool138:
    # F3_s139 → F3_t140 (new body)
    with BuildSketch(Plane(origin=(12.6357139903, -7.2952328737, 0), x_dir=(0, 0, 1), z_dir=(-0.8660254038, 0.5, 0))):
        Polygon((0, -8), (5, -3), (0, -3), align=None)
    extrude(amount=F3_T140_DEPTH)

    split(bisect_by=Plane(origin=(2, -3.4641016151, 4), x_dir=(-0.8660254038, -0.5, 0), z_dir=(-0.3535533906, 0.6123724357, -0.7071067812)), keep=Keep.TOP)

    split(bisect_by=Plane(origin=(-4, 0, 4), x_dir=(0, 1, 0), z_dir=(0.7071067812, 0, -0.7071067812)), keep=Keep.TOP)


with BuildPart() as f1_23:
    add(f1_22.part)

    # F3_t137: cut F3_tool138
    add(f3_tool138.part, mode=Mode.SUBTRACT)


with BuildPart() as f3_tool144:
    # F3_s145 → F3_t146 (new body)
    with BuildSketch(Plane.XZ.offset(14.5904657474)):
        Polygon((-8, 0), (-3, 5), (-3, 0), align=None)
    extrude(amount=-F3_T146_DEPTH)

    split(bisect_by=Plane(origin=(-2, -3.4641016151, 4), x_dir=(-0.8660254038, 0.5, 0), z_dir=(0.3535533906, 0.6123724357, -0.7071067812)), keep=Keep.TOP)

    split(bisect_by=Plane(origin=(-2, 3.4641016151, 4), x_dir=(0.8660254038, 0.5, 0), z_dir=(0.3535533906, -0.6123724357, -0.7071067812)), keep=Keep.TOP)


with BuildPart() as f1_24:
    add(f1_23.part)

    # F3_t143: cut F3_tool144
    add(f3_tool144.part, mode=Mode.SUBTRACT)

    # F4 (on face) → F5 (join)
    with BuildSketch(Plane.XY.offset(15)):
        with Locations((105, 0)):
            Circle(F4_R)
    extrude(amount=F5_DEPTH)

    # F6 (on Front) → F7 (revolve)
    with BuildSketch(Plane.XZ):
        with BuildLine():
            Line((108.3080768585, 66.9323056936), (105, 66.9323056936))
            Line((105, 66.9323056936), (105, 20))
            Line((105, 20), (110.0828945637, 20))
            add(Edge.make_bspline(
                [(110.0828945637, 20), (112.0426276757, 22.363673848), (116.5861959485, 27.8437592299), (106.6734024331, 44.5470793569), (116.570655373, 49.9594893214), (116.8964211839, 65.5898079545), (110.8957227351, 66.5278041763), (108.3080768585, 66.9323056936)],
                knots=[0, 0, 0, 0, 0.1852557032, 0.4295082555, 0.6154016859, 0.8341515178, 1, 1, 1, 1], degree=3))
        make_face()
    revolve(axis=Axis((105, 0, 43.4661528468), (0, 0, -1)))


solid = f1_24.part
